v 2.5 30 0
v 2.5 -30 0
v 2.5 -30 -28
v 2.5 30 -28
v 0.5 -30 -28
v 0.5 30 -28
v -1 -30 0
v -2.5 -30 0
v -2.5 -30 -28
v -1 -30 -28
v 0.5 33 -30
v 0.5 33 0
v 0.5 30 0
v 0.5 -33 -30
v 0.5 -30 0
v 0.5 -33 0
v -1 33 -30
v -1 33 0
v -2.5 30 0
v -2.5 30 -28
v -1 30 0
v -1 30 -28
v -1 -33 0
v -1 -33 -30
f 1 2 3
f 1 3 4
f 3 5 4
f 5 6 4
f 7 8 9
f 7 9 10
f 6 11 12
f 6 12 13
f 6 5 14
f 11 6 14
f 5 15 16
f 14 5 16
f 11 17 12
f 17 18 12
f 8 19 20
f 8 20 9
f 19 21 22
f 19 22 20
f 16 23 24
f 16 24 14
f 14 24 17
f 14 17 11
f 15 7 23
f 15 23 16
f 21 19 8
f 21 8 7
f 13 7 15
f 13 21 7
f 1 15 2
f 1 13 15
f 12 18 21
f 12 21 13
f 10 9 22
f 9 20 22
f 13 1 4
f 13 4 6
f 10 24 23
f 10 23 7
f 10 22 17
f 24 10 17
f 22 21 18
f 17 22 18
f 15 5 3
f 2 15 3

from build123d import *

# Parameters (mm, degrees)
F1_DEPTH = 28
F2_W     = 1.5
F2_H     = 66
F3_DEPTH = 2


with BuildPart() as f1:
    # F0 (on Top) → F1 (new body)
    with BuildSketch(Plane.XY):
        Polygon((0.5, -30), (2.5, -30), (2.5, 30), (0.5, 30), (-1, 30), (-2.5, 30), (-2.5, -30), (-1, -30), align=None)
        Polygon((-1, 30), (0.5, 30), (0.5, 31.5), (0.5, 33), (-1, 33), align=None)
        Polygon((0.5, -31.5), (0.5, -30), (-1, -30), (-1, -33), (0.5, -33), align=None)
    extrude(amount=-F1_DEPTH)

    # F2 (on face) → F3 (join)
    with BuildSketch(Plane(origin=(0, 0, -28), x_dir=(1, 0, 0), z_dir=(0, 0, -1))):
        with Locations((-0.25, 0)):
            Rectangle(F2_W, F2_H)
        Polygon((0.5, 30), (0.5, 33), (-1, 33), (-1, 30), (-1, -30), (-1, -33), (0.5, -33), (0.5, -30), align=None)
    extrude(amount=F3_DEPTH)


solid = f1.part
